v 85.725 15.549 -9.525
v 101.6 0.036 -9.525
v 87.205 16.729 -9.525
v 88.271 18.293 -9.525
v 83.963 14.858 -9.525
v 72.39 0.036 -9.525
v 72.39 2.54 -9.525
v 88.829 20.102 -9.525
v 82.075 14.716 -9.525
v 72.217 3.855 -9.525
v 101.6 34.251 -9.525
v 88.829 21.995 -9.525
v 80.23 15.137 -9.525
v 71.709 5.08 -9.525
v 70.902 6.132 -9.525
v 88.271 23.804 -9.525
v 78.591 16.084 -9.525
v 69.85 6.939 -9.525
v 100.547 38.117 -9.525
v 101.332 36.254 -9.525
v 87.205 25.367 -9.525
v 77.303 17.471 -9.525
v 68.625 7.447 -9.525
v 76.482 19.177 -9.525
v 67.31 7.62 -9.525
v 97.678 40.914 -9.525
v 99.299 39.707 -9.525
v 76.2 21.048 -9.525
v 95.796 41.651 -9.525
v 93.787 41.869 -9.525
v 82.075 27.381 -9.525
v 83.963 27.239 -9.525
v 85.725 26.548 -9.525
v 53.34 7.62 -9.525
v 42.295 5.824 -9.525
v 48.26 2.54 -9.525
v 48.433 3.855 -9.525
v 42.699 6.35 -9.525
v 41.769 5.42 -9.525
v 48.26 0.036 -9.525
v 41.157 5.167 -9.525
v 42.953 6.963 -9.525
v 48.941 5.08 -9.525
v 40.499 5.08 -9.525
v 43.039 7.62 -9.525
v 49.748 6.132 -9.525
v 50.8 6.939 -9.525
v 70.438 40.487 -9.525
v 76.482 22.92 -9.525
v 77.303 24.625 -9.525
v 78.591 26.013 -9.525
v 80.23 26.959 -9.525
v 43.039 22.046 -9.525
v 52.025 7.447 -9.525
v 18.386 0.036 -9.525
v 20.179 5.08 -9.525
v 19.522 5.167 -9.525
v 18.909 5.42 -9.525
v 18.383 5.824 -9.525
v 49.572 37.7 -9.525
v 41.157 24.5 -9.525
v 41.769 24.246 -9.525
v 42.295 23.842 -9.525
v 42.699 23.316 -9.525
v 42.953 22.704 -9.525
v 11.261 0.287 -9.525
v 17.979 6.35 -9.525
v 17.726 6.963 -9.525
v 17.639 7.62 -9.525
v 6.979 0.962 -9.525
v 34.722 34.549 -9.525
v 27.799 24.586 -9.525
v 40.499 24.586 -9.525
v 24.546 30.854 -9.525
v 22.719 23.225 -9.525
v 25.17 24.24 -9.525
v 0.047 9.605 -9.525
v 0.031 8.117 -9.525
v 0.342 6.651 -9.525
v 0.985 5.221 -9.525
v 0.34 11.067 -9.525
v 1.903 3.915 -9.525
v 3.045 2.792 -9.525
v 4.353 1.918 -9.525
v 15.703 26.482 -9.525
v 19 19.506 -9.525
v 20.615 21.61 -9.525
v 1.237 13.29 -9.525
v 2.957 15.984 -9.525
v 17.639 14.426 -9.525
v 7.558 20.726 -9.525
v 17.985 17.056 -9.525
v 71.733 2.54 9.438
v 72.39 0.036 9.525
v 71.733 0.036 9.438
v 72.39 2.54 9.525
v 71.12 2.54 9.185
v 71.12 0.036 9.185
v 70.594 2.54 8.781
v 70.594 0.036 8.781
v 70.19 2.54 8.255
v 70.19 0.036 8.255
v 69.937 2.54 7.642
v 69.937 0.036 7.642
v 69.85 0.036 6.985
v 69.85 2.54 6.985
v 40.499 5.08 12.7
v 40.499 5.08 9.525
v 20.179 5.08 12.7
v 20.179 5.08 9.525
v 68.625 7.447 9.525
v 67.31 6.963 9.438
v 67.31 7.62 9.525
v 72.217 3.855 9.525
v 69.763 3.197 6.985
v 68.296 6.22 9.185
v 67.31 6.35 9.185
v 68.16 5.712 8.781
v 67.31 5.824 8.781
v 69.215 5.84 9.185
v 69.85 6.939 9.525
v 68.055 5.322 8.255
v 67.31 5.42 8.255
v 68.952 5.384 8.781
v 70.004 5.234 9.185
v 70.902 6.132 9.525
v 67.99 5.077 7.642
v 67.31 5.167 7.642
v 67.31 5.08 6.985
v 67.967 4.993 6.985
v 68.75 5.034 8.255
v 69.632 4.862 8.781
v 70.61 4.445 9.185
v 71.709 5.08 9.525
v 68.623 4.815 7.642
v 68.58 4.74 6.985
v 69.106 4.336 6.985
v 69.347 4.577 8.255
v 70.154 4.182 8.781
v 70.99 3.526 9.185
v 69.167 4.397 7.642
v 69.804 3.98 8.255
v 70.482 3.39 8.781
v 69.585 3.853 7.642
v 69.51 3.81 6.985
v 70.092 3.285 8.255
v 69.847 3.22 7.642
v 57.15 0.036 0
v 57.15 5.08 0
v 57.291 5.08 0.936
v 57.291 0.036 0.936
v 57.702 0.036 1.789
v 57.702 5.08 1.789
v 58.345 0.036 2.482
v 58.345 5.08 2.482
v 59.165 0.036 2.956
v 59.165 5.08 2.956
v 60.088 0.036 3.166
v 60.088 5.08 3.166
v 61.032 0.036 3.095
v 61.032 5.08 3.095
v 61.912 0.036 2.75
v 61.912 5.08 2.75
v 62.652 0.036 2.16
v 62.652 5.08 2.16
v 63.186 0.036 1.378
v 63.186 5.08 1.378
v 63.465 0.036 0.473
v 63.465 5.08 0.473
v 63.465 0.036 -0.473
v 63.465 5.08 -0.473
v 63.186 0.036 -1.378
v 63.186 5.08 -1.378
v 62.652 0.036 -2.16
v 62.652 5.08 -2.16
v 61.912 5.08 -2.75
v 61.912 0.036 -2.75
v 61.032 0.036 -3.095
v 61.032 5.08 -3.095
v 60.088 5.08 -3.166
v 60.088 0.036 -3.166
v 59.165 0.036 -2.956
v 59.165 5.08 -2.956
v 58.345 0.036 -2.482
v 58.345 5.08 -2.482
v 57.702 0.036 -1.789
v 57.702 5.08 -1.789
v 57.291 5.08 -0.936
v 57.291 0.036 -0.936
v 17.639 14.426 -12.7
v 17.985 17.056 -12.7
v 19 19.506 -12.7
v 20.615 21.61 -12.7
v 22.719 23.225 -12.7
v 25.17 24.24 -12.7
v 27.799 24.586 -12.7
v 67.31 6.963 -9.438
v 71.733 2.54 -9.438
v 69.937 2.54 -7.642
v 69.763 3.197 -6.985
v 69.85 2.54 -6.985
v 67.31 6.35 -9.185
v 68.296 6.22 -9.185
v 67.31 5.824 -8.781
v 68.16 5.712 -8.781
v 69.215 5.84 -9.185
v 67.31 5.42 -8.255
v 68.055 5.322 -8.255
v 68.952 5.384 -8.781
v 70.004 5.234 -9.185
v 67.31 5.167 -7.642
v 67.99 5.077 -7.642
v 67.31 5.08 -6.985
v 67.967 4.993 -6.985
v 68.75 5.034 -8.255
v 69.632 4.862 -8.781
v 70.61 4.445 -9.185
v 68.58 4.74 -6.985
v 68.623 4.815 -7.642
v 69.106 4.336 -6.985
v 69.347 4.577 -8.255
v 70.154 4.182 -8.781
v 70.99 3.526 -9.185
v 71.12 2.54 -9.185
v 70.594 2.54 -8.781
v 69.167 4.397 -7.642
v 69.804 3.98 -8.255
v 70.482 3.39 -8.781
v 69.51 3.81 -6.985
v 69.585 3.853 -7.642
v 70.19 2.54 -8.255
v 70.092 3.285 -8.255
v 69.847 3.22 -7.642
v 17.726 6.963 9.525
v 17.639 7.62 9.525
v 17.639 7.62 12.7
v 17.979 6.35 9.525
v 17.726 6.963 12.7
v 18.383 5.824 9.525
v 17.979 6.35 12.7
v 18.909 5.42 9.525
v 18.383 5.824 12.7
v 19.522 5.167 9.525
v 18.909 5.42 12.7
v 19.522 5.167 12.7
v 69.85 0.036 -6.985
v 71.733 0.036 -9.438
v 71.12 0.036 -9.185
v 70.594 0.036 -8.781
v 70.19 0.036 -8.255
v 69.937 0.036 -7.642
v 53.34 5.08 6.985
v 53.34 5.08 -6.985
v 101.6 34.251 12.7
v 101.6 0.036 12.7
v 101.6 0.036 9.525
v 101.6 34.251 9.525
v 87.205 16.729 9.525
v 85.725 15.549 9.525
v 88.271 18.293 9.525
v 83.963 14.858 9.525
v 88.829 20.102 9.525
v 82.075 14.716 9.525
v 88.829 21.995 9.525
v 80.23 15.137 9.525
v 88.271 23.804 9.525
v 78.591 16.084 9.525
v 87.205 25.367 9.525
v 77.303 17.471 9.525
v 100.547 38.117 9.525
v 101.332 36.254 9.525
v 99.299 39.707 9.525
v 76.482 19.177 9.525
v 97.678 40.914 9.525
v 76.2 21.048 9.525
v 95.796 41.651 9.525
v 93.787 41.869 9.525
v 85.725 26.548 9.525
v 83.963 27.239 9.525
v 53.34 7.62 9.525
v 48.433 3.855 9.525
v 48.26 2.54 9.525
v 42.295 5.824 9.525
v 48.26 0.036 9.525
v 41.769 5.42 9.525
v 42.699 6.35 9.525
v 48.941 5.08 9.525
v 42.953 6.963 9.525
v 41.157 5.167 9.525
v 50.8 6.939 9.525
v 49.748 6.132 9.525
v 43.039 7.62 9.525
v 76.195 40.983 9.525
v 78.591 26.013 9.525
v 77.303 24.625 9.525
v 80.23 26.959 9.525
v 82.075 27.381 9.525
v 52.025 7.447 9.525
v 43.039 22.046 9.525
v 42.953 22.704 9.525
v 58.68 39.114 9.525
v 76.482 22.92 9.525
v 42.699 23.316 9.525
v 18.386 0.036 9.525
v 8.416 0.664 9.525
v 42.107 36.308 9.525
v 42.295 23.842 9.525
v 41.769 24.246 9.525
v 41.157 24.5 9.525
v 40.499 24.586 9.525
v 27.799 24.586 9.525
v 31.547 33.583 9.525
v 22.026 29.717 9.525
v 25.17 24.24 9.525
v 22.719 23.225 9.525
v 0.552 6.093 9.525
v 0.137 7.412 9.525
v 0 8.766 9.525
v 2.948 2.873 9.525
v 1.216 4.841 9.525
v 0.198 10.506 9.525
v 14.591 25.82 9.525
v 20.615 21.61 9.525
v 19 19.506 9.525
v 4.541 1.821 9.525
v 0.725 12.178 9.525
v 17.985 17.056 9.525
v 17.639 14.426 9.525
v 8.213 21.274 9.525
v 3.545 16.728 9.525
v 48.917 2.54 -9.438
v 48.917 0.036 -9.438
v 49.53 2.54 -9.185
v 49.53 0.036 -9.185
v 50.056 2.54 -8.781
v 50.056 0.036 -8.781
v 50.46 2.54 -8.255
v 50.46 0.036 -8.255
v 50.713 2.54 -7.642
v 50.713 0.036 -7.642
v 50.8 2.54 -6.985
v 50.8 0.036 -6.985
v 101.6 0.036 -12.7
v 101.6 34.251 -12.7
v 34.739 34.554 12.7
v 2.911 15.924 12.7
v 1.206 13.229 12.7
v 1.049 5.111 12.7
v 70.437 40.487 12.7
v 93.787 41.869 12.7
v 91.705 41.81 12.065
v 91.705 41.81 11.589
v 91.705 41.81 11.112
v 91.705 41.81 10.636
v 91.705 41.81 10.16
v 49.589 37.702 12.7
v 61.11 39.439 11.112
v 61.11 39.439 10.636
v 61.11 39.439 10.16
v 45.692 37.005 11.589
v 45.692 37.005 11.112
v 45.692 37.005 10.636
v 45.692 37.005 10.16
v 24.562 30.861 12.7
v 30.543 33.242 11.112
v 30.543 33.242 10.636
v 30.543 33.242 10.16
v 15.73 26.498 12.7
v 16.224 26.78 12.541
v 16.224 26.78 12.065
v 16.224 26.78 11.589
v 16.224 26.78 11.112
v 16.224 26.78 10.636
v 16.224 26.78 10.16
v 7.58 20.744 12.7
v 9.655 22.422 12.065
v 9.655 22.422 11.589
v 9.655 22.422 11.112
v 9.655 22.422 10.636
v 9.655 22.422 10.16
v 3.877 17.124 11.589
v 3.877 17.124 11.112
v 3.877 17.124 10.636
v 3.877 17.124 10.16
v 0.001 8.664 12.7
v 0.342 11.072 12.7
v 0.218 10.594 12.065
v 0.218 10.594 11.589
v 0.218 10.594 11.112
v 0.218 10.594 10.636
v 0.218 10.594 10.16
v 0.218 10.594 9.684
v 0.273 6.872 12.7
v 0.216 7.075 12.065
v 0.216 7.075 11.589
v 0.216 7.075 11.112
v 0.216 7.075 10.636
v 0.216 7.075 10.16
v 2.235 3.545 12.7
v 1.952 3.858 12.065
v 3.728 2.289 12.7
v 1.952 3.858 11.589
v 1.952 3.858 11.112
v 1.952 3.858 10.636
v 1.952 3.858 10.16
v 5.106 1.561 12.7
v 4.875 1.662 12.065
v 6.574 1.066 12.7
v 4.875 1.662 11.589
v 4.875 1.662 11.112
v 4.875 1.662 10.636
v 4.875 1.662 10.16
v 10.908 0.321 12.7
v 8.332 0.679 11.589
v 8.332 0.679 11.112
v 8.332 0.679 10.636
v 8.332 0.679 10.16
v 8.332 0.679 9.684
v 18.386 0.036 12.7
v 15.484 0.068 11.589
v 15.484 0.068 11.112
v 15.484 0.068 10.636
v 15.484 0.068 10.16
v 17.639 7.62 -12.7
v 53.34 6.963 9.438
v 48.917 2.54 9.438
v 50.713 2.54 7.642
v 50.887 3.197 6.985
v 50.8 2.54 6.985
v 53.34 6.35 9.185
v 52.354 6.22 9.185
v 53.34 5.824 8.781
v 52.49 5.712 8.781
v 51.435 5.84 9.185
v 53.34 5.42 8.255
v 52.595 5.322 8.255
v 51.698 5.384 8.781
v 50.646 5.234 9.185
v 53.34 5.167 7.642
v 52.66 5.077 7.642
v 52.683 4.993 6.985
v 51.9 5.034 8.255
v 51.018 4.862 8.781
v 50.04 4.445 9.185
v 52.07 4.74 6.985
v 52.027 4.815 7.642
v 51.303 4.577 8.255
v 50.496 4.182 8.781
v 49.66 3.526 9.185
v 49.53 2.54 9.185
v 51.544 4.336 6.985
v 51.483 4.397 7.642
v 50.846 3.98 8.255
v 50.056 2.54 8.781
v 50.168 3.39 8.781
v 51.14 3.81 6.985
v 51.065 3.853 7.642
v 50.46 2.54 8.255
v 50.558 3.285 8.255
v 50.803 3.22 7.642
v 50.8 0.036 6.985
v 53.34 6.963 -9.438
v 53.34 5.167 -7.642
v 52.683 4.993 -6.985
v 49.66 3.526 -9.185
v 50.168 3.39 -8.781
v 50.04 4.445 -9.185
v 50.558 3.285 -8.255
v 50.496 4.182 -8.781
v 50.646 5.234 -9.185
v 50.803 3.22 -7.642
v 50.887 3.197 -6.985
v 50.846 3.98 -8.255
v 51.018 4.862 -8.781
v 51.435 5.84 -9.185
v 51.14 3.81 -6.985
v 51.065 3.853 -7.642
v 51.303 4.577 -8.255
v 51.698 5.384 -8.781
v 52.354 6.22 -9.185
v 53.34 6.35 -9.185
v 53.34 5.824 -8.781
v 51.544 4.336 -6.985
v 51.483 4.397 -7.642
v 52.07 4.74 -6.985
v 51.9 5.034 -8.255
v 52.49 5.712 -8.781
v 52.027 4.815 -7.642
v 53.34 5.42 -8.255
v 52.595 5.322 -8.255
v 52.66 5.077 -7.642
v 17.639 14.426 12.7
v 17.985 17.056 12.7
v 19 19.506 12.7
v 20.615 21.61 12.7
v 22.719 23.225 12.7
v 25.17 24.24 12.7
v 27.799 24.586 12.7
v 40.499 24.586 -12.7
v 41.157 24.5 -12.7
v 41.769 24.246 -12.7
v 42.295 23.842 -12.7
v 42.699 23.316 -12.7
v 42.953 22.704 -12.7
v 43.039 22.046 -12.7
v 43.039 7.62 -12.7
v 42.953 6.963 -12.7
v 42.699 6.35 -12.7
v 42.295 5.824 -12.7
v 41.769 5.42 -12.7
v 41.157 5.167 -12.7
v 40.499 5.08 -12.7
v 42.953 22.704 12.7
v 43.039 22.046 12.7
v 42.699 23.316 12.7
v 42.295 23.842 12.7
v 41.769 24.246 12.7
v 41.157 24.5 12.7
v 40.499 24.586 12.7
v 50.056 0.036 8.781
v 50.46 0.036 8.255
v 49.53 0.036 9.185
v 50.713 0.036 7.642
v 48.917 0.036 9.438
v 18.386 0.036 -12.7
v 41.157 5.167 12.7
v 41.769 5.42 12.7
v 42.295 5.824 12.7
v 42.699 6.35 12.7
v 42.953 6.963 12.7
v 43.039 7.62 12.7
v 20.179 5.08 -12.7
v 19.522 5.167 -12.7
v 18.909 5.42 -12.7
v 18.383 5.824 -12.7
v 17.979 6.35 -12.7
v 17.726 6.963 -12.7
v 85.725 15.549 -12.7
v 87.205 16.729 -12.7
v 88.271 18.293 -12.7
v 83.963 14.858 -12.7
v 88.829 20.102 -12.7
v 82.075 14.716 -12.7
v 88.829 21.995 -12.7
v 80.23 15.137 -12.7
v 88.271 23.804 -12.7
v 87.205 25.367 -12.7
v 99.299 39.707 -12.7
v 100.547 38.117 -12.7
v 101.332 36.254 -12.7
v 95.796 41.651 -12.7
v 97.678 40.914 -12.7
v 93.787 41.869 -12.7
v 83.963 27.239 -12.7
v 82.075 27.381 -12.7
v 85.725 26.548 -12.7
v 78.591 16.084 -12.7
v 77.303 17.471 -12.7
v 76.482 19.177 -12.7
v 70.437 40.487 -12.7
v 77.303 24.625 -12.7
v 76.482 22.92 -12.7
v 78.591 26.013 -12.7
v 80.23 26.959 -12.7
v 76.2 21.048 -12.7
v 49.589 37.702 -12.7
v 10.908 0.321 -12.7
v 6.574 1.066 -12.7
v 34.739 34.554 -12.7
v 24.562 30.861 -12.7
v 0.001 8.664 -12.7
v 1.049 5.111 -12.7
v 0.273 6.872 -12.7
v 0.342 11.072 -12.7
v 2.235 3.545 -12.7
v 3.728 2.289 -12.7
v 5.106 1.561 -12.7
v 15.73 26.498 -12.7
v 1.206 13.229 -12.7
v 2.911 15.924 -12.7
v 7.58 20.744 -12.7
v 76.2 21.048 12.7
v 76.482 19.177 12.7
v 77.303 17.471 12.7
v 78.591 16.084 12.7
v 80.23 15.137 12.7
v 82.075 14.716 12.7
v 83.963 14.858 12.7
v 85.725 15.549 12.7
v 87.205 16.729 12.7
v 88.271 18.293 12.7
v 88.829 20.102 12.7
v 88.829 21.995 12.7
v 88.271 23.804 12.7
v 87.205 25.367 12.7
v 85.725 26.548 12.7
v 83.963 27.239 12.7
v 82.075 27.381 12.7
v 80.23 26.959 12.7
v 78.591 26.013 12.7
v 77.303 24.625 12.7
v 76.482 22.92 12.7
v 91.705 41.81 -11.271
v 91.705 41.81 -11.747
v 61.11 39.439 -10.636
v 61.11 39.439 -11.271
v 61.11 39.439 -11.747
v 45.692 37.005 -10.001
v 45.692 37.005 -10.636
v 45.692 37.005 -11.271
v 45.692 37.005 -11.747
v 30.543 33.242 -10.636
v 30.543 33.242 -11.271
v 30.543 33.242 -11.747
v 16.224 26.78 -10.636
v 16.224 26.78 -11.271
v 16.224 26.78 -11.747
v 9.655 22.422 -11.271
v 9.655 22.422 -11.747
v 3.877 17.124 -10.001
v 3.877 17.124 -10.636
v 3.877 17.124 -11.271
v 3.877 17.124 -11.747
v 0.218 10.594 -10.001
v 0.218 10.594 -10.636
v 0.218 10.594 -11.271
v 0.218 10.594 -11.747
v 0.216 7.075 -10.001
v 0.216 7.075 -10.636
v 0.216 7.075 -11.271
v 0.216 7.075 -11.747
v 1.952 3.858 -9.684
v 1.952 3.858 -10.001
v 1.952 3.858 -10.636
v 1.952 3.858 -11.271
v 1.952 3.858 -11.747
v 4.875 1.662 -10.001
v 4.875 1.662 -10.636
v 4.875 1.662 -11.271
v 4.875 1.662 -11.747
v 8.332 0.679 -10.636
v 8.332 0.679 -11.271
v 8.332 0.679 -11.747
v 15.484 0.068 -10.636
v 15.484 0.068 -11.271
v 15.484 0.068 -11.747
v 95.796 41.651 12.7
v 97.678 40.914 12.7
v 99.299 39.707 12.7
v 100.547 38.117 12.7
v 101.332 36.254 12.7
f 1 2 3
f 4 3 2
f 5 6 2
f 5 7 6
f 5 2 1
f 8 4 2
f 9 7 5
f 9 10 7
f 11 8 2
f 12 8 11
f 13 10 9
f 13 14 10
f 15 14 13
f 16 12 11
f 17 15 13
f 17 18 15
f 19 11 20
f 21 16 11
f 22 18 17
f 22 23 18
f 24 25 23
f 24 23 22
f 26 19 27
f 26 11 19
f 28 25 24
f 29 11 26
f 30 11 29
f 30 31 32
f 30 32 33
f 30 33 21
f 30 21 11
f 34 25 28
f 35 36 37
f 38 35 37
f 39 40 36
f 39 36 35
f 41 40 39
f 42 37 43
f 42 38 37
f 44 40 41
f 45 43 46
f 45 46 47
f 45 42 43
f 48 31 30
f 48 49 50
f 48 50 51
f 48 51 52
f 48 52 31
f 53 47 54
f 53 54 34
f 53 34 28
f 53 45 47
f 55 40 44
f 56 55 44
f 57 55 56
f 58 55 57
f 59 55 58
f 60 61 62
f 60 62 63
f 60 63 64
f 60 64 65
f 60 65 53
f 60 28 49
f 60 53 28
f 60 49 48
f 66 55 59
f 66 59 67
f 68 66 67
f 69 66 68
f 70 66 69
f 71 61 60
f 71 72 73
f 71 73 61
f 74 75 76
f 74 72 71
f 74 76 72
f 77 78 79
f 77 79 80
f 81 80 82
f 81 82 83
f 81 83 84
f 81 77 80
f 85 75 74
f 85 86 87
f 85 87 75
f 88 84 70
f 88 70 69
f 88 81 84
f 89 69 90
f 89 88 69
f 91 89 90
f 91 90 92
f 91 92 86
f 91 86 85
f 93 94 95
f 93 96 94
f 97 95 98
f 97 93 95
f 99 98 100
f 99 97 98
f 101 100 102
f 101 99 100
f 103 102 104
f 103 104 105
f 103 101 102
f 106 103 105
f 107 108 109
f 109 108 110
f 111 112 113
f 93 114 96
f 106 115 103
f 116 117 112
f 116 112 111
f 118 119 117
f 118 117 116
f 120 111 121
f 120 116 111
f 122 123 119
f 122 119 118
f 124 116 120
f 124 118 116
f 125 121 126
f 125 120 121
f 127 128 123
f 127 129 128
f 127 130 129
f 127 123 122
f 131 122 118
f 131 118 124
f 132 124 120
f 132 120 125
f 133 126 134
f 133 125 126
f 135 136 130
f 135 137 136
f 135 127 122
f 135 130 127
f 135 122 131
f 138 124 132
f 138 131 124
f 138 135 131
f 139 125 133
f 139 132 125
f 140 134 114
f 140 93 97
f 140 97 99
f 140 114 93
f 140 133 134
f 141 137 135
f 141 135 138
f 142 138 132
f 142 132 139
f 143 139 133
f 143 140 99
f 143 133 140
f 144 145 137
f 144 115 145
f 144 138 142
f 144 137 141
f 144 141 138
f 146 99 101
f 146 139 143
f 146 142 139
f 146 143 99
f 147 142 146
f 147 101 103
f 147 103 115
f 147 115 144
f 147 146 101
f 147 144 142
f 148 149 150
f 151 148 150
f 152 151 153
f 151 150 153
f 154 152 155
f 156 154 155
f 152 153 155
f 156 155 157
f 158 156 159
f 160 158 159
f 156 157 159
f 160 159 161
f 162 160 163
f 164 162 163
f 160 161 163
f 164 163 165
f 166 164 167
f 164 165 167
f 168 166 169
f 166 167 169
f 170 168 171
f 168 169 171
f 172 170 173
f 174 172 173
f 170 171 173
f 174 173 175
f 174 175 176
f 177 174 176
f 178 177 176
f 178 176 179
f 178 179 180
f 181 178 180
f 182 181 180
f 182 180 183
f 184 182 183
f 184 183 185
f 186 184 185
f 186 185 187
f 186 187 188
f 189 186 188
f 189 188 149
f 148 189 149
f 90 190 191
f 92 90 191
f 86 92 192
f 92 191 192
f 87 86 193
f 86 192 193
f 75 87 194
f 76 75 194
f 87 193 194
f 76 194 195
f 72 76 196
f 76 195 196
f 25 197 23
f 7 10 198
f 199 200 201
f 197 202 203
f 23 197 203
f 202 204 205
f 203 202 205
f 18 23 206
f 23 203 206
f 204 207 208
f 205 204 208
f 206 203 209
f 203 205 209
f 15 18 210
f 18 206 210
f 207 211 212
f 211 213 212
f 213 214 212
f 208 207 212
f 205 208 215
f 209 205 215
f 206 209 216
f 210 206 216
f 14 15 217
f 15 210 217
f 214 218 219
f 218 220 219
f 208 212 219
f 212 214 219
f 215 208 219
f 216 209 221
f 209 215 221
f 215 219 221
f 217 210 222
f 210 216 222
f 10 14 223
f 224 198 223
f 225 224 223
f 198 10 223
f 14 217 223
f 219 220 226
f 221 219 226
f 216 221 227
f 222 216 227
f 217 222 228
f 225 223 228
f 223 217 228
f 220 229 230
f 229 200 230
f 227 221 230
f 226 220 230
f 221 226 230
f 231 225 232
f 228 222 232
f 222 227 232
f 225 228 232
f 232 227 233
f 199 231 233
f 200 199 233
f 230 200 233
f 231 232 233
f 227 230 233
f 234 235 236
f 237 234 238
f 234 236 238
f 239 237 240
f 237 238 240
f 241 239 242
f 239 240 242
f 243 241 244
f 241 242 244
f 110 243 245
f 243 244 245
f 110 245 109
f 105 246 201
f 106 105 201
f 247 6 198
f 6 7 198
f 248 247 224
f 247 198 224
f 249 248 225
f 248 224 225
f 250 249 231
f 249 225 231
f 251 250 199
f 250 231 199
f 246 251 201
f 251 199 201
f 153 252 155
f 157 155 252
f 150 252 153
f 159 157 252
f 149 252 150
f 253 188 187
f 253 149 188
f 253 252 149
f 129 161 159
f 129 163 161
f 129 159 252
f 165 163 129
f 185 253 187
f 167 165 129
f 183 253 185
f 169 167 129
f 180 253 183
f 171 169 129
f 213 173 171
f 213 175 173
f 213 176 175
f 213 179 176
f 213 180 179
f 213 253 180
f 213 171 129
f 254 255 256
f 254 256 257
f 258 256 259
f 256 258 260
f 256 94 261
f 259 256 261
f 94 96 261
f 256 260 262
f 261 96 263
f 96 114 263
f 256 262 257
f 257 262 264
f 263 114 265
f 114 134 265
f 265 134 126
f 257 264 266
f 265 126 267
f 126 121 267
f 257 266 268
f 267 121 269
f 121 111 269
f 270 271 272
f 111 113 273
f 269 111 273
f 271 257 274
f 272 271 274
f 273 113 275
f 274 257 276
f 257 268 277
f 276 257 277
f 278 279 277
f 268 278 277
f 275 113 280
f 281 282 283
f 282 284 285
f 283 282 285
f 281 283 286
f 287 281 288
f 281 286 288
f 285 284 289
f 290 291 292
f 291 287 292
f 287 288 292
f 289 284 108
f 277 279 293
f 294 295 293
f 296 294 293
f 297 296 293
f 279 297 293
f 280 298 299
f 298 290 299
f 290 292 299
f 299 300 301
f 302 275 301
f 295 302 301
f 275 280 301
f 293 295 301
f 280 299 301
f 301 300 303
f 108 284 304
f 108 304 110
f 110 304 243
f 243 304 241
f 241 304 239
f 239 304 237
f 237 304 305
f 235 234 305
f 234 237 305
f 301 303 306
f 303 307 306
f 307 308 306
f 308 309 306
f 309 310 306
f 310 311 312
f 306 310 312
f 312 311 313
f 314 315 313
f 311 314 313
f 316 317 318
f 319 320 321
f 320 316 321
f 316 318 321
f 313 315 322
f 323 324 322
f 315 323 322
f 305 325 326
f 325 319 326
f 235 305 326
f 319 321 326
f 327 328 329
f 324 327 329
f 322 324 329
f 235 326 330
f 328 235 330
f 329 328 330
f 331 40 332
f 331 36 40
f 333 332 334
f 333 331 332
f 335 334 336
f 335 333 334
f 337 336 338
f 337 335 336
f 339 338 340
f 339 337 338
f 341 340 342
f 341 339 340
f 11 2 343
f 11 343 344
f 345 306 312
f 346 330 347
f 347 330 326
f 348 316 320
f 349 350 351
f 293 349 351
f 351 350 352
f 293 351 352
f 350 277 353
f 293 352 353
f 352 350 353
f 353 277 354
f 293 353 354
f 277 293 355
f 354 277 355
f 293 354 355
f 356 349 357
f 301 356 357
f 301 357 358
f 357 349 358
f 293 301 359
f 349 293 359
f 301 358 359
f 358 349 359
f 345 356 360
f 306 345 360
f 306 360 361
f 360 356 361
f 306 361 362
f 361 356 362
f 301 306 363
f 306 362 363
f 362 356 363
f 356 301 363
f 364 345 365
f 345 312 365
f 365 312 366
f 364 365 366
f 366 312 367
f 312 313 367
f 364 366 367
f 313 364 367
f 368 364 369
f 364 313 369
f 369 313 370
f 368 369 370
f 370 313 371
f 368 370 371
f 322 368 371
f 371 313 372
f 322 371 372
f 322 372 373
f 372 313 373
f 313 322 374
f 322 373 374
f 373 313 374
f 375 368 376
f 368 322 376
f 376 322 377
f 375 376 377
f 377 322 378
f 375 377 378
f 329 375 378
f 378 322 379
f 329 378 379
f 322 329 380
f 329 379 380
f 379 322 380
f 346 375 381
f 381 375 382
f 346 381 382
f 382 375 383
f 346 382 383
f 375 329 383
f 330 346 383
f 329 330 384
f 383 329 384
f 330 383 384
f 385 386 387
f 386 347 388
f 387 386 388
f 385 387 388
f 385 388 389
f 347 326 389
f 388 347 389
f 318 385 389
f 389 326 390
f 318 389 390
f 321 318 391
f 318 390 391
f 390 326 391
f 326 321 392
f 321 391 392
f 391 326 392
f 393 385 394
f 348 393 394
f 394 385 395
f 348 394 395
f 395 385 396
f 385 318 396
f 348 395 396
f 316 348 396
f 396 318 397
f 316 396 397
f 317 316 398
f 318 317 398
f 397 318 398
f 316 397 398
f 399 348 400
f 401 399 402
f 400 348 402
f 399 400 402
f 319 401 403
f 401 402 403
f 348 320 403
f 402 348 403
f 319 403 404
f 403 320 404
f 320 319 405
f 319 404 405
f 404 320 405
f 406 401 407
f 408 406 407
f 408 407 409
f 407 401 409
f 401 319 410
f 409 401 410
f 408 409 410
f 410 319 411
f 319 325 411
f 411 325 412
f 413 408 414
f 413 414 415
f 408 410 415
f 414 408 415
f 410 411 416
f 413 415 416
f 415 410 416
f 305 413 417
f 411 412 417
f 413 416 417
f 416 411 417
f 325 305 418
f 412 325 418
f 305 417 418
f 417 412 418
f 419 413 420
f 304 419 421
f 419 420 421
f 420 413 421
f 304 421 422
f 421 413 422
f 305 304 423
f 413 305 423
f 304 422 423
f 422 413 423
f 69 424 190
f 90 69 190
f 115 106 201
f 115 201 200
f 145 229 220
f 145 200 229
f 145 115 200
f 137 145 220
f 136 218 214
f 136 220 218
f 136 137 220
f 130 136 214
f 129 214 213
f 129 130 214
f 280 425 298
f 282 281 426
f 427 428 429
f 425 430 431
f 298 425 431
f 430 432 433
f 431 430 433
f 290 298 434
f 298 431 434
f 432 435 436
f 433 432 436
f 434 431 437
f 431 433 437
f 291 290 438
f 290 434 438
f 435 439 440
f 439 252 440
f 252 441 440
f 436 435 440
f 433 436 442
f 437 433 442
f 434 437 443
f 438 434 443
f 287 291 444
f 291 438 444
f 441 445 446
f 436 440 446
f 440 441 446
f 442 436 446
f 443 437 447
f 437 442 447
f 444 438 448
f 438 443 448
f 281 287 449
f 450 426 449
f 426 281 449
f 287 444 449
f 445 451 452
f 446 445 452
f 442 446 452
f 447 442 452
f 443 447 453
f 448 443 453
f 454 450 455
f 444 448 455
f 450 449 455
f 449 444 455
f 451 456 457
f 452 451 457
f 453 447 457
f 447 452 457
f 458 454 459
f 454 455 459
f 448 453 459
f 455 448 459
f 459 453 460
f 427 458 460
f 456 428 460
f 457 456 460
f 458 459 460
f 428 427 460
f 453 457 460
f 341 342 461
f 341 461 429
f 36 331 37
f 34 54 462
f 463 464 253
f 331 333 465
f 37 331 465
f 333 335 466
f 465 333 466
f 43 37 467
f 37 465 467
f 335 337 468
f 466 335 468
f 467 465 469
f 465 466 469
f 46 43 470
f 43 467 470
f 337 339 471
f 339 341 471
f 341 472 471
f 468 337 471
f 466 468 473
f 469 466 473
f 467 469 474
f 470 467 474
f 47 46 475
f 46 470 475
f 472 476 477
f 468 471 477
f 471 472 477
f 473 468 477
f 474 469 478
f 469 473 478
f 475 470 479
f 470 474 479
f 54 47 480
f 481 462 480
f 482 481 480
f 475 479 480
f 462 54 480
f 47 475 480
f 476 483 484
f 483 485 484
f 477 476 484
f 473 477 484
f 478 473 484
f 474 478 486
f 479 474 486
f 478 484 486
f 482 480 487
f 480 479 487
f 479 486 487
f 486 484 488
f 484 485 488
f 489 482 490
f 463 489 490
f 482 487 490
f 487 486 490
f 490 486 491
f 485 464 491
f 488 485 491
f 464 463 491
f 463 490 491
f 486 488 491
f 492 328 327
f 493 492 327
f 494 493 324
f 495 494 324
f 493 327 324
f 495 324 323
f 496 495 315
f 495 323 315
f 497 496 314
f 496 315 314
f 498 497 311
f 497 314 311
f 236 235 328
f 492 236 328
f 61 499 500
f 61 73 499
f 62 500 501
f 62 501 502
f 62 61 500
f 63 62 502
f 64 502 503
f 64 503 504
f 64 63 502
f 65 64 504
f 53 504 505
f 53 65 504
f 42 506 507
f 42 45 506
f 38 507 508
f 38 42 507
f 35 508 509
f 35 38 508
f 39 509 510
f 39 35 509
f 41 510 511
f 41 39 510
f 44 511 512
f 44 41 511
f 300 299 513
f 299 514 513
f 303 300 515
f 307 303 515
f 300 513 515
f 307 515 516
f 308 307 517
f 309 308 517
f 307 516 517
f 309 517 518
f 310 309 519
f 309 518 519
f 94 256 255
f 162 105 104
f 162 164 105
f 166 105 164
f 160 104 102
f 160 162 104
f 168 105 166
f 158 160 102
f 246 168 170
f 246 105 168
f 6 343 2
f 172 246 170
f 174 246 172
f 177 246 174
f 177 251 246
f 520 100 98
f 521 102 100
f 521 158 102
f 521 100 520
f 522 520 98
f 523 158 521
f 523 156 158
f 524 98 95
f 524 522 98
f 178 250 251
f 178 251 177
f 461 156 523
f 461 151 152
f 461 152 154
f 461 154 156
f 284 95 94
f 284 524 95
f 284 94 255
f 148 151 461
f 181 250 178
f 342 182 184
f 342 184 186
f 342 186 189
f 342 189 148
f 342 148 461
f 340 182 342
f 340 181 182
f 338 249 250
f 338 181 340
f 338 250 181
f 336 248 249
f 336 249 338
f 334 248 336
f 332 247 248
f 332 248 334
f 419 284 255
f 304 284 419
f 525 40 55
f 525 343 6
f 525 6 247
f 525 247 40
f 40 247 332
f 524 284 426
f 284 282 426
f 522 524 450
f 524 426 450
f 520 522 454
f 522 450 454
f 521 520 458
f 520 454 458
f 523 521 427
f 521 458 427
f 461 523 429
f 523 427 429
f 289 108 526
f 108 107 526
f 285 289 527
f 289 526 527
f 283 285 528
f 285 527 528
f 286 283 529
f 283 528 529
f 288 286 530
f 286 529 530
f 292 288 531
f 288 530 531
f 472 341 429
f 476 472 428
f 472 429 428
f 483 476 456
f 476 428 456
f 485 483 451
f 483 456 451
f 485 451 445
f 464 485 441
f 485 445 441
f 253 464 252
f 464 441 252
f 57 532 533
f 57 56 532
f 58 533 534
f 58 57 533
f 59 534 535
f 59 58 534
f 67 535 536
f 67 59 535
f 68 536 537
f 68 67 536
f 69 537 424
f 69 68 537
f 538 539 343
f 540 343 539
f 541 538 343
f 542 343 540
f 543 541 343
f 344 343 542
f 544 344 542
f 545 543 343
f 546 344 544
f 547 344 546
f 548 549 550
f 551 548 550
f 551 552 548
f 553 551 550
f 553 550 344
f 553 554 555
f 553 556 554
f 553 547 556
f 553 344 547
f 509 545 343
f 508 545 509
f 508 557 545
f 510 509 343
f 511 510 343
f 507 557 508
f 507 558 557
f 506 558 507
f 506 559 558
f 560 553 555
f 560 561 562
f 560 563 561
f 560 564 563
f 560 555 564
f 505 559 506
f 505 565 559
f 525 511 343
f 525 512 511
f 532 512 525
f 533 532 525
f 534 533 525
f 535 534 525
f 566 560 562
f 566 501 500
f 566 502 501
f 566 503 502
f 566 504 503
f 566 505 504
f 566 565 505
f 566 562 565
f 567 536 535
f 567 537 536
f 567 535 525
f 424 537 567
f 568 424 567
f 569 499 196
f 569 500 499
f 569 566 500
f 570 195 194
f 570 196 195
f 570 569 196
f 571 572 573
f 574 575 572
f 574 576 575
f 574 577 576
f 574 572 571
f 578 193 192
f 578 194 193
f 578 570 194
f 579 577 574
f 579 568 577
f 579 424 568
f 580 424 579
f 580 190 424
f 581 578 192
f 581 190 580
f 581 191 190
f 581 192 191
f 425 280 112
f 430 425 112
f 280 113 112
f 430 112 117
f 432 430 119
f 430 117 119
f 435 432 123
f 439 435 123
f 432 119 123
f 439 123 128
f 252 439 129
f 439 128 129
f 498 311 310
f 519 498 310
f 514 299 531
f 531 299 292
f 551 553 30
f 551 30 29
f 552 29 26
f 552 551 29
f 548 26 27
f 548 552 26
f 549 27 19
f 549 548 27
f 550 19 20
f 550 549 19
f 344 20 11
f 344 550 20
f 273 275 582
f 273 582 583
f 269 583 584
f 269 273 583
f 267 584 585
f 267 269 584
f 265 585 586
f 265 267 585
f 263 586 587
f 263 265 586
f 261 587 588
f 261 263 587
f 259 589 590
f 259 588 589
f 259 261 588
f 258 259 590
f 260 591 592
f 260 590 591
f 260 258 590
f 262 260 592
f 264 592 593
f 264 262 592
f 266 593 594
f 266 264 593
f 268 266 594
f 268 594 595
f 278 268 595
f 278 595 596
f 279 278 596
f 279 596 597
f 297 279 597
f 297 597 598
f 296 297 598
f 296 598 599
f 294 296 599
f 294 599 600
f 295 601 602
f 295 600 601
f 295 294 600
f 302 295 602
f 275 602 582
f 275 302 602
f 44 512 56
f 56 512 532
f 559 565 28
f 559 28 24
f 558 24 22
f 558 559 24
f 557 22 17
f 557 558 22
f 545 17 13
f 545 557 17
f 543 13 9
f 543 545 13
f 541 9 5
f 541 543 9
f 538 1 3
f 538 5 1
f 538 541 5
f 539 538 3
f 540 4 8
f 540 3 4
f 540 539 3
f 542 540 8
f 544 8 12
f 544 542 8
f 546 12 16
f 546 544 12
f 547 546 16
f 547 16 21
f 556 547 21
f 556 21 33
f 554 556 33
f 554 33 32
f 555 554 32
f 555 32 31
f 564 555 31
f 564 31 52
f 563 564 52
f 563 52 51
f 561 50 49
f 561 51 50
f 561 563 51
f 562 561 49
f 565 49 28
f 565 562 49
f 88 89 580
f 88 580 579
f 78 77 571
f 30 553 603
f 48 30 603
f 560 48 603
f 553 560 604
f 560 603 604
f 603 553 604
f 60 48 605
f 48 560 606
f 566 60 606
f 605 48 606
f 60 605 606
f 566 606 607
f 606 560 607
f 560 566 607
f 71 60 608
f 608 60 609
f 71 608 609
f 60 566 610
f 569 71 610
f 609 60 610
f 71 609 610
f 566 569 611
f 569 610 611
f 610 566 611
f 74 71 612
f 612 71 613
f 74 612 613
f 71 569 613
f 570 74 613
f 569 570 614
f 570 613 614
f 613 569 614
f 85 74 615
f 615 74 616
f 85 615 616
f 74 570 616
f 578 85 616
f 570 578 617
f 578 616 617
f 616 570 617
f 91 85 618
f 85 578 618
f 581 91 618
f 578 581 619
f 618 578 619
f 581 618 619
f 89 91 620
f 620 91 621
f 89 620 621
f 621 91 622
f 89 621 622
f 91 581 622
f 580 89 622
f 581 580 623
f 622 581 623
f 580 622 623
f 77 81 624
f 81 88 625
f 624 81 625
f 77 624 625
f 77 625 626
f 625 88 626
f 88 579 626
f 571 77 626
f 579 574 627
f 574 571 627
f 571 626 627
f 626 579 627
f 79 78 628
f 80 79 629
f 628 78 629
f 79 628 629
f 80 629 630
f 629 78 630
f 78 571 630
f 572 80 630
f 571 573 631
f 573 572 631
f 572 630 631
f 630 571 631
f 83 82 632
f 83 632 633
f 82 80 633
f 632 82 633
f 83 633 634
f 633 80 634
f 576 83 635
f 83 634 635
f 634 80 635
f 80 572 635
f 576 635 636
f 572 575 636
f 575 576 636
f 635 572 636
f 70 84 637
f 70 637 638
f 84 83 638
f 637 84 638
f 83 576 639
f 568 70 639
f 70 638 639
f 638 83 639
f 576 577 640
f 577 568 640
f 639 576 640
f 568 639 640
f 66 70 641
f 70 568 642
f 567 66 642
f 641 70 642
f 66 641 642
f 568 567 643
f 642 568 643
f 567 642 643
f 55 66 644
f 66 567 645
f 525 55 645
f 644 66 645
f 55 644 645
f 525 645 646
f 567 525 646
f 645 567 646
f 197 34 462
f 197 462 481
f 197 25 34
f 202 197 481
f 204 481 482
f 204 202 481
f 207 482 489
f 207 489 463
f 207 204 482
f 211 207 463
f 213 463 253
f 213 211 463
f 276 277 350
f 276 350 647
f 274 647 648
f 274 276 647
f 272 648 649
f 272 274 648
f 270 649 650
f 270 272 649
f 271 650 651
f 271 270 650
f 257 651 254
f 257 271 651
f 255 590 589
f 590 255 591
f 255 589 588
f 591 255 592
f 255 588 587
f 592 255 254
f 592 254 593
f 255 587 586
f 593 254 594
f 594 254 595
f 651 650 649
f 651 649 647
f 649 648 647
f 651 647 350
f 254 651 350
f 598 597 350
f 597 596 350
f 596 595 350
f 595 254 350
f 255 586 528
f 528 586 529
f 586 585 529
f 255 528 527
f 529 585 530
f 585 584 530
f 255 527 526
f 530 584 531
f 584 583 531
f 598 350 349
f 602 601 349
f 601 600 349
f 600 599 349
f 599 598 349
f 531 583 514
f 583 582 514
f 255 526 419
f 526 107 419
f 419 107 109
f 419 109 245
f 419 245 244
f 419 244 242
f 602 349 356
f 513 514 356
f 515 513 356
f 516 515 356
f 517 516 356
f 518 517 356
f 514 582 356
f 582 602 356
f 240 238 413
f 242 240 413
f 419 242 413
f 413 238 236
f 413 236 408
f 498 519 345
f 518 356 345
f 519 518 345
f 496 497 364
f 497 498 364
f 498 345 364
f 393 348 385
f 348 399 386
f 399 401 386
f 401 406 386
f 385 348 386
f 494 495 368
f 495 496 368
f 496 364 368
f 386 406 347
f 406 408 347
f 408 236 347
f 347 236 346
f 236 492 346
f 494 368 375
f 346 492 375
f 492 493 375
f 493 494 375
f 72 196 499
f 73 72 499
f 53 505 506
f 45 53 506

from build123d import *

# Parameters (mm, degrees)
BOSS_EXTRUDE1_DEPTH      = 12.7
BOSS_EXTRUDE1_DEPTH_BACK = 12.7
SKETCH2_W                = 19.05
SKETCH2_H                = 49.651656102
CUT_EXTRUDE1_DEPTH       = 310.423757716
SKETCH3_W                = 38.1
SKETCH3_H                = 5.044027725
SKETCH3_W_2              = 19.05
BOSS_EXTRUDE2_DEPTH      = 19.05
CUT_EXTRUDE3_DEPTH       = 50.8
CUT_EXTRUDE3_DEPTH_BACK  = 50.8
SKETCH12_R               = 6.35
SKETCH12_R_2             = 3.175
SKETCH12_R_3             = 5
FILLET8_R                = 2.54
SKETCH13_W               = 213.045597148
SKETCH13_H               = 55.670329679
CUT_EXTRUDE4_DEPTH       = 311.204708703
FILLET9_START            = 9
FILLET9_DEPTH            = 5
FILLET10_START           = -14
FILLET10_DEPTH           = 5
CUT_EXTRUDE5_DEPTH       = 113.114633783
CUT_EXTRUDE5_DEPTH_BACK  = 113.114633783
FILLET11_R               = 2.54
SKETCH8_R                = 3.175
CUT_EXTRUDE2_DEPTH       = 109.799942755


with BuildPart() as part:
    # Sketch1 → Boss-Extrude1 (new, two sides: drawn at the far end of the back side and taken through both)
    with BuildSketch(Plane.XY.offset(-BOSS_EXTRUDE1_DEPTH_BACK)):
        with BuildLine():
            Line((306.2918866, 1.929193729), (306.2918866, 0.035972275))
            Line((306.2918866, 0.035972275), (18.385743088, 0.035972275))
            add(Edge.make_bspline(
                [(306.2918866, 1.929193729), (306.565703117, 2.60439044), (288.5800577, 7.542224382), (271.922557924, 13.119693618), (244.545512993, 21.039717296), (214.63705438, 29.578808281), (183.74892315, 35.843363942), (153.039666672, 39.584058053), (122.364389131, 41.910380286), (91.676834287, 42.234137684), (66.092232531, 40.375185886), (45.725322729, 37.15263137), (32.792424184, 34.392213233), (22.784634494, 30.143895353), (14.954380304, 26.333975955), (8.569620221, 21.769960087), (2.606076707, 16.225698301), (-1.858362456, 8.564778309), (3.017819974, 2.013571533), (8.993020993, 0.344786487), (13.886881629, 0.072440703), (17.418928388, 0.035163036), (18.385743088, 0.035972275)],
                knots=[0, 0, 0, 0, 0.025556044, 0.050960447, 0.101552747, 0.151805438, 0.201252492, 0.250083002, 0.298629141, 0.347026117, 0.395536064, 0.420002519, 0.444885368, 0.457915187, 0.471441031, 0.48620838, 0.494593531, 0.510948222, 0.521394631, 0.527823606, 0.539981828, 0.544566103, 0.544566103, 0.544566103, 0.544566103], degree=3))
        make_face()
    extrude(amount=BOSS_EXTRUDE1_DEPTH + BOSS_EXTRUDE1_DEPTH_BACK)

    # Sketch2 → Cut-Extrude1 (cut, through all)
    with BuildSketch(Plane(origin=(0, 0, 0), x_dir=(0, 0, -1), z_dir=(1, 0, 0))):
        with Locations((0, 22.711736939)):
            Rectangle(SKETCH2_W, SKETCH2_H)
    extrude(amount=CUT_EXTRUDE1_DEPTH, mode=Mode.SUBTRACT)


with BuildPart() as cut_extrude1_piece_1:
    # of the separate pieces the step leaves, piece 1, a body of its own (cut_extrude1_pieces)
    add(part.part.solids().sort_by_distance((306.2918866, 0.035972275, 9.525))[0])



with BuildPart() as cut_extrude1_piece_2:
    # of the separate pieces the step leaves, piece 2, a body of its own (cut_extrude1_pieces)
    add(part.part.solids().sort_by_distance((306.2918866, 1.929193729, -9.525))[0])


with BuildPart() as cut_extrude1_piece_1_1:
    add(cut_extrude1_piece_1.part)

    add(cut_extrude1_piece_2.part)  # Boss-Extrude2 merges Cut-Extrude1 piece 2
    # Sketch3 → Boss-Extrude2 (add)
    with BuildSketch(Plane.XY.offset(-9.525)):
        with Locations((190.372920526, 2.557986137)):
            Rectangle(SKETCH3_W, SKETCH3_H)
        with Locations((60.325, 2.557986137)):
            Rectangle(SKETCH3_W_2, SKETCH3_H)
    extrude(amount=BOSS_EXTRUDE2_DEPTH)

    # Sketch12 → Cut-Extrude3 (cut, two sides: drawn at the far end of the back side and taken through both)
    with BuildSketch(Plane.XY.offset(-CUT_EXTRUDE3_DEPTH_BACK)):
        with Locations(Location((82.55, 21.048356458, 0), (0, 0, 180))):
            Circle(SKETCH12_R)
        with Locations(Location((152.4, 21.048356458, 0), (0, 0, 180))):
            Circle(SKETCH12_R_2)
        with Locations(Location((228.6, 13.349794258, 0), (0, 0, 180))):
            Circle(SKETCH12_R_2)
        with Locations(Location((117.475, 21.048356458, 0), (0, 0, 180))):
            Circle(SKETCH12_R_3)
    extrude(amount=CUT_EXTRUDE3_DEPTH + CUT_EXTRUDE3_DEPTH_BACK, mode=Mode.SUBTRACT)

    # Fillet8
    fillet8_edges = [cut_extrude1_piece_1_1.edges().sort_by_distance(p)[0] for p in [
        (60.325, 5.08, -9.525),
        (69.85, 2.557986137, -9.525),
        (60.325, 5.08, 9.525),
        (69.85, 2.557986137, 9.525),
        (171.322920526, 2.557986137, -9.525),
        (171.322920526, 5.08, 0),
        (190.372920526, 5.08, 9.525),
        (209.422920526, 5.08, 0),
        (190.372920526, 5.08, -9.525),
        (209.422920526, 2.557986137, 9.525),
        (209.422920526, 2.557986137, -9.525),
        (171.322920526, 2.557986137, 9.525),
        (69.85, 5.08, 0),
        (50.8, 2.557986137, 9.525),
        (50.8, 5.08, 0),
        (50.8, 2.557986137, -9.525),
    ]]
    fillet(fillet8_edges, radius=FILLET8_R)

    # Sketch13 → Cut-Extrude4 (cut, through all)
    with BuildSketch(Plane.XY.offset(12.7)):
        with Locations((208.122798574, 27.871137115)):
            Rectangle(SKETCH13_W, SKETCH13_H)
    extrude(amount=-CUT_EXTRUDE4_DEPTH, mode=Mode.SUBTRACT)

    # Fillet9: read off the stored shape, not the designer's step
    # Fillet9 outline → Fillet9 (cut)
    with BuildSketch(Plane.XY.offset(FILLET9_START)):
        with BuildLine():
            ThreePointArc((93.786667063, 41.868544727), (99.299361006, 39.707076762), (101.6, 34.250997722))
            Line((101.6, 34.250997722), (101.6, 41.986781628))
            add(Edge.make_bspline(
                [(101.6, 41.986781628), (98.995537309, 41.973544215), (96.390994688, 41.934642423), (93.786667063, 41.868544727)],
                knots=[0.331387316, 0.331387316, 0.331387316, 0.331387316, 0.343736136, 0.343736136, 0.343736136, 0.343736136], degree=3))
        make_face()
    extrude(amount=FILLET9_DEPTH, mode=Mode.SUBTRACT)

    # Fillet10: read off the stored shape, not the designer's step
    # Fillet10 outline → Fillet10 (cut)
    with BuildSketch(Plane.XY.offset(FILLET10_START)):
        with BuildLine():
            ThreePointArc((93.786667063, 41.868544727), (99.299361006, 39.707076762), (101.6, 34.250997722))
            Line((101.6, 34.250997722), (101.6, 41.986781628))
            add(Edge.make_bspline(
                [(101.6, 41.986781628), (98.995537309, 41.973544215), (96.390994688, 41.934642423), (93.786667063, 41.868544727)],
                knots=[0.331387316, 0.331387316, 0.331387316, 0.331387316, 0.343736136, 0.343736136, 0.343736136, 0.343736136], degree=3))
        make_face()
    extrude(amount=FILLET10_DEPTH, mode=Mode.SUBTRACT)

    # Sketch3<7> → Cut-Extrude5 (cut, two sides: drawn at the far end of the back side and taken through both)
    with BuildSketch(Plane.XY.offset(-9.525).offset(-CUT_EXTRUDE5_DEPTH_BACK)):
        with BuildLine():
            ThreePointArc((17.639162626, 14.426247308), (20.614957729, 21.610452205), (27.799162626, 24.586247308))
            Line((27.799162626, 24.586247308), (43.039162626, 24.586247308))
            Line((43.039162626, 24.586247308), (43.039162626, 5.08))
            Line((43.039162626, 5.08), (17.639162626, 5.08))
            Line((17.639162626, 5.08), (17.639162626, 14.426247308))
        make_face()
    extrude(amount=CUT_EXTRUDE5_DEPTH + CUT_EXTRUDE5_DEPTH_BACK, mode=Mode.SUBTRACT)

    # Fillet11
    fillet11_edges = [cut_extrude1_piece_1_1.edges().sort_by_distance(p)[0] for p in [
        (43.039162626, 24.586247308, -11.1125),
        (43.039162626, 5.08, -11.1125),
        (17.639162626, 5.08, -11.1125),
        (43.039162626, 24.586247308, 11.1125),
        (43.039162626, 5.08, 11.1125),
        (17.639162626, 5.08, 11.1125),
    ]]
    fillet(fillet11_edges, radius=FILLET11_R)

    # Sketch8 → Cut-Extrude2 (cut, through all)
    with BuildSketch(Plane(origin=(0, 5.08, 0), x_dir=(-1, 0, 0), z_dir=(0, 1, 0))):
        with Locations((-60.325, 0)):
            Circle(SKETCH8_R)
    extrude(amount=-CUT_EXTRUDE2_DEPTH, mode=Mode.SUBTRACT)


solid = cut_extrude1_piece_1_1.part
